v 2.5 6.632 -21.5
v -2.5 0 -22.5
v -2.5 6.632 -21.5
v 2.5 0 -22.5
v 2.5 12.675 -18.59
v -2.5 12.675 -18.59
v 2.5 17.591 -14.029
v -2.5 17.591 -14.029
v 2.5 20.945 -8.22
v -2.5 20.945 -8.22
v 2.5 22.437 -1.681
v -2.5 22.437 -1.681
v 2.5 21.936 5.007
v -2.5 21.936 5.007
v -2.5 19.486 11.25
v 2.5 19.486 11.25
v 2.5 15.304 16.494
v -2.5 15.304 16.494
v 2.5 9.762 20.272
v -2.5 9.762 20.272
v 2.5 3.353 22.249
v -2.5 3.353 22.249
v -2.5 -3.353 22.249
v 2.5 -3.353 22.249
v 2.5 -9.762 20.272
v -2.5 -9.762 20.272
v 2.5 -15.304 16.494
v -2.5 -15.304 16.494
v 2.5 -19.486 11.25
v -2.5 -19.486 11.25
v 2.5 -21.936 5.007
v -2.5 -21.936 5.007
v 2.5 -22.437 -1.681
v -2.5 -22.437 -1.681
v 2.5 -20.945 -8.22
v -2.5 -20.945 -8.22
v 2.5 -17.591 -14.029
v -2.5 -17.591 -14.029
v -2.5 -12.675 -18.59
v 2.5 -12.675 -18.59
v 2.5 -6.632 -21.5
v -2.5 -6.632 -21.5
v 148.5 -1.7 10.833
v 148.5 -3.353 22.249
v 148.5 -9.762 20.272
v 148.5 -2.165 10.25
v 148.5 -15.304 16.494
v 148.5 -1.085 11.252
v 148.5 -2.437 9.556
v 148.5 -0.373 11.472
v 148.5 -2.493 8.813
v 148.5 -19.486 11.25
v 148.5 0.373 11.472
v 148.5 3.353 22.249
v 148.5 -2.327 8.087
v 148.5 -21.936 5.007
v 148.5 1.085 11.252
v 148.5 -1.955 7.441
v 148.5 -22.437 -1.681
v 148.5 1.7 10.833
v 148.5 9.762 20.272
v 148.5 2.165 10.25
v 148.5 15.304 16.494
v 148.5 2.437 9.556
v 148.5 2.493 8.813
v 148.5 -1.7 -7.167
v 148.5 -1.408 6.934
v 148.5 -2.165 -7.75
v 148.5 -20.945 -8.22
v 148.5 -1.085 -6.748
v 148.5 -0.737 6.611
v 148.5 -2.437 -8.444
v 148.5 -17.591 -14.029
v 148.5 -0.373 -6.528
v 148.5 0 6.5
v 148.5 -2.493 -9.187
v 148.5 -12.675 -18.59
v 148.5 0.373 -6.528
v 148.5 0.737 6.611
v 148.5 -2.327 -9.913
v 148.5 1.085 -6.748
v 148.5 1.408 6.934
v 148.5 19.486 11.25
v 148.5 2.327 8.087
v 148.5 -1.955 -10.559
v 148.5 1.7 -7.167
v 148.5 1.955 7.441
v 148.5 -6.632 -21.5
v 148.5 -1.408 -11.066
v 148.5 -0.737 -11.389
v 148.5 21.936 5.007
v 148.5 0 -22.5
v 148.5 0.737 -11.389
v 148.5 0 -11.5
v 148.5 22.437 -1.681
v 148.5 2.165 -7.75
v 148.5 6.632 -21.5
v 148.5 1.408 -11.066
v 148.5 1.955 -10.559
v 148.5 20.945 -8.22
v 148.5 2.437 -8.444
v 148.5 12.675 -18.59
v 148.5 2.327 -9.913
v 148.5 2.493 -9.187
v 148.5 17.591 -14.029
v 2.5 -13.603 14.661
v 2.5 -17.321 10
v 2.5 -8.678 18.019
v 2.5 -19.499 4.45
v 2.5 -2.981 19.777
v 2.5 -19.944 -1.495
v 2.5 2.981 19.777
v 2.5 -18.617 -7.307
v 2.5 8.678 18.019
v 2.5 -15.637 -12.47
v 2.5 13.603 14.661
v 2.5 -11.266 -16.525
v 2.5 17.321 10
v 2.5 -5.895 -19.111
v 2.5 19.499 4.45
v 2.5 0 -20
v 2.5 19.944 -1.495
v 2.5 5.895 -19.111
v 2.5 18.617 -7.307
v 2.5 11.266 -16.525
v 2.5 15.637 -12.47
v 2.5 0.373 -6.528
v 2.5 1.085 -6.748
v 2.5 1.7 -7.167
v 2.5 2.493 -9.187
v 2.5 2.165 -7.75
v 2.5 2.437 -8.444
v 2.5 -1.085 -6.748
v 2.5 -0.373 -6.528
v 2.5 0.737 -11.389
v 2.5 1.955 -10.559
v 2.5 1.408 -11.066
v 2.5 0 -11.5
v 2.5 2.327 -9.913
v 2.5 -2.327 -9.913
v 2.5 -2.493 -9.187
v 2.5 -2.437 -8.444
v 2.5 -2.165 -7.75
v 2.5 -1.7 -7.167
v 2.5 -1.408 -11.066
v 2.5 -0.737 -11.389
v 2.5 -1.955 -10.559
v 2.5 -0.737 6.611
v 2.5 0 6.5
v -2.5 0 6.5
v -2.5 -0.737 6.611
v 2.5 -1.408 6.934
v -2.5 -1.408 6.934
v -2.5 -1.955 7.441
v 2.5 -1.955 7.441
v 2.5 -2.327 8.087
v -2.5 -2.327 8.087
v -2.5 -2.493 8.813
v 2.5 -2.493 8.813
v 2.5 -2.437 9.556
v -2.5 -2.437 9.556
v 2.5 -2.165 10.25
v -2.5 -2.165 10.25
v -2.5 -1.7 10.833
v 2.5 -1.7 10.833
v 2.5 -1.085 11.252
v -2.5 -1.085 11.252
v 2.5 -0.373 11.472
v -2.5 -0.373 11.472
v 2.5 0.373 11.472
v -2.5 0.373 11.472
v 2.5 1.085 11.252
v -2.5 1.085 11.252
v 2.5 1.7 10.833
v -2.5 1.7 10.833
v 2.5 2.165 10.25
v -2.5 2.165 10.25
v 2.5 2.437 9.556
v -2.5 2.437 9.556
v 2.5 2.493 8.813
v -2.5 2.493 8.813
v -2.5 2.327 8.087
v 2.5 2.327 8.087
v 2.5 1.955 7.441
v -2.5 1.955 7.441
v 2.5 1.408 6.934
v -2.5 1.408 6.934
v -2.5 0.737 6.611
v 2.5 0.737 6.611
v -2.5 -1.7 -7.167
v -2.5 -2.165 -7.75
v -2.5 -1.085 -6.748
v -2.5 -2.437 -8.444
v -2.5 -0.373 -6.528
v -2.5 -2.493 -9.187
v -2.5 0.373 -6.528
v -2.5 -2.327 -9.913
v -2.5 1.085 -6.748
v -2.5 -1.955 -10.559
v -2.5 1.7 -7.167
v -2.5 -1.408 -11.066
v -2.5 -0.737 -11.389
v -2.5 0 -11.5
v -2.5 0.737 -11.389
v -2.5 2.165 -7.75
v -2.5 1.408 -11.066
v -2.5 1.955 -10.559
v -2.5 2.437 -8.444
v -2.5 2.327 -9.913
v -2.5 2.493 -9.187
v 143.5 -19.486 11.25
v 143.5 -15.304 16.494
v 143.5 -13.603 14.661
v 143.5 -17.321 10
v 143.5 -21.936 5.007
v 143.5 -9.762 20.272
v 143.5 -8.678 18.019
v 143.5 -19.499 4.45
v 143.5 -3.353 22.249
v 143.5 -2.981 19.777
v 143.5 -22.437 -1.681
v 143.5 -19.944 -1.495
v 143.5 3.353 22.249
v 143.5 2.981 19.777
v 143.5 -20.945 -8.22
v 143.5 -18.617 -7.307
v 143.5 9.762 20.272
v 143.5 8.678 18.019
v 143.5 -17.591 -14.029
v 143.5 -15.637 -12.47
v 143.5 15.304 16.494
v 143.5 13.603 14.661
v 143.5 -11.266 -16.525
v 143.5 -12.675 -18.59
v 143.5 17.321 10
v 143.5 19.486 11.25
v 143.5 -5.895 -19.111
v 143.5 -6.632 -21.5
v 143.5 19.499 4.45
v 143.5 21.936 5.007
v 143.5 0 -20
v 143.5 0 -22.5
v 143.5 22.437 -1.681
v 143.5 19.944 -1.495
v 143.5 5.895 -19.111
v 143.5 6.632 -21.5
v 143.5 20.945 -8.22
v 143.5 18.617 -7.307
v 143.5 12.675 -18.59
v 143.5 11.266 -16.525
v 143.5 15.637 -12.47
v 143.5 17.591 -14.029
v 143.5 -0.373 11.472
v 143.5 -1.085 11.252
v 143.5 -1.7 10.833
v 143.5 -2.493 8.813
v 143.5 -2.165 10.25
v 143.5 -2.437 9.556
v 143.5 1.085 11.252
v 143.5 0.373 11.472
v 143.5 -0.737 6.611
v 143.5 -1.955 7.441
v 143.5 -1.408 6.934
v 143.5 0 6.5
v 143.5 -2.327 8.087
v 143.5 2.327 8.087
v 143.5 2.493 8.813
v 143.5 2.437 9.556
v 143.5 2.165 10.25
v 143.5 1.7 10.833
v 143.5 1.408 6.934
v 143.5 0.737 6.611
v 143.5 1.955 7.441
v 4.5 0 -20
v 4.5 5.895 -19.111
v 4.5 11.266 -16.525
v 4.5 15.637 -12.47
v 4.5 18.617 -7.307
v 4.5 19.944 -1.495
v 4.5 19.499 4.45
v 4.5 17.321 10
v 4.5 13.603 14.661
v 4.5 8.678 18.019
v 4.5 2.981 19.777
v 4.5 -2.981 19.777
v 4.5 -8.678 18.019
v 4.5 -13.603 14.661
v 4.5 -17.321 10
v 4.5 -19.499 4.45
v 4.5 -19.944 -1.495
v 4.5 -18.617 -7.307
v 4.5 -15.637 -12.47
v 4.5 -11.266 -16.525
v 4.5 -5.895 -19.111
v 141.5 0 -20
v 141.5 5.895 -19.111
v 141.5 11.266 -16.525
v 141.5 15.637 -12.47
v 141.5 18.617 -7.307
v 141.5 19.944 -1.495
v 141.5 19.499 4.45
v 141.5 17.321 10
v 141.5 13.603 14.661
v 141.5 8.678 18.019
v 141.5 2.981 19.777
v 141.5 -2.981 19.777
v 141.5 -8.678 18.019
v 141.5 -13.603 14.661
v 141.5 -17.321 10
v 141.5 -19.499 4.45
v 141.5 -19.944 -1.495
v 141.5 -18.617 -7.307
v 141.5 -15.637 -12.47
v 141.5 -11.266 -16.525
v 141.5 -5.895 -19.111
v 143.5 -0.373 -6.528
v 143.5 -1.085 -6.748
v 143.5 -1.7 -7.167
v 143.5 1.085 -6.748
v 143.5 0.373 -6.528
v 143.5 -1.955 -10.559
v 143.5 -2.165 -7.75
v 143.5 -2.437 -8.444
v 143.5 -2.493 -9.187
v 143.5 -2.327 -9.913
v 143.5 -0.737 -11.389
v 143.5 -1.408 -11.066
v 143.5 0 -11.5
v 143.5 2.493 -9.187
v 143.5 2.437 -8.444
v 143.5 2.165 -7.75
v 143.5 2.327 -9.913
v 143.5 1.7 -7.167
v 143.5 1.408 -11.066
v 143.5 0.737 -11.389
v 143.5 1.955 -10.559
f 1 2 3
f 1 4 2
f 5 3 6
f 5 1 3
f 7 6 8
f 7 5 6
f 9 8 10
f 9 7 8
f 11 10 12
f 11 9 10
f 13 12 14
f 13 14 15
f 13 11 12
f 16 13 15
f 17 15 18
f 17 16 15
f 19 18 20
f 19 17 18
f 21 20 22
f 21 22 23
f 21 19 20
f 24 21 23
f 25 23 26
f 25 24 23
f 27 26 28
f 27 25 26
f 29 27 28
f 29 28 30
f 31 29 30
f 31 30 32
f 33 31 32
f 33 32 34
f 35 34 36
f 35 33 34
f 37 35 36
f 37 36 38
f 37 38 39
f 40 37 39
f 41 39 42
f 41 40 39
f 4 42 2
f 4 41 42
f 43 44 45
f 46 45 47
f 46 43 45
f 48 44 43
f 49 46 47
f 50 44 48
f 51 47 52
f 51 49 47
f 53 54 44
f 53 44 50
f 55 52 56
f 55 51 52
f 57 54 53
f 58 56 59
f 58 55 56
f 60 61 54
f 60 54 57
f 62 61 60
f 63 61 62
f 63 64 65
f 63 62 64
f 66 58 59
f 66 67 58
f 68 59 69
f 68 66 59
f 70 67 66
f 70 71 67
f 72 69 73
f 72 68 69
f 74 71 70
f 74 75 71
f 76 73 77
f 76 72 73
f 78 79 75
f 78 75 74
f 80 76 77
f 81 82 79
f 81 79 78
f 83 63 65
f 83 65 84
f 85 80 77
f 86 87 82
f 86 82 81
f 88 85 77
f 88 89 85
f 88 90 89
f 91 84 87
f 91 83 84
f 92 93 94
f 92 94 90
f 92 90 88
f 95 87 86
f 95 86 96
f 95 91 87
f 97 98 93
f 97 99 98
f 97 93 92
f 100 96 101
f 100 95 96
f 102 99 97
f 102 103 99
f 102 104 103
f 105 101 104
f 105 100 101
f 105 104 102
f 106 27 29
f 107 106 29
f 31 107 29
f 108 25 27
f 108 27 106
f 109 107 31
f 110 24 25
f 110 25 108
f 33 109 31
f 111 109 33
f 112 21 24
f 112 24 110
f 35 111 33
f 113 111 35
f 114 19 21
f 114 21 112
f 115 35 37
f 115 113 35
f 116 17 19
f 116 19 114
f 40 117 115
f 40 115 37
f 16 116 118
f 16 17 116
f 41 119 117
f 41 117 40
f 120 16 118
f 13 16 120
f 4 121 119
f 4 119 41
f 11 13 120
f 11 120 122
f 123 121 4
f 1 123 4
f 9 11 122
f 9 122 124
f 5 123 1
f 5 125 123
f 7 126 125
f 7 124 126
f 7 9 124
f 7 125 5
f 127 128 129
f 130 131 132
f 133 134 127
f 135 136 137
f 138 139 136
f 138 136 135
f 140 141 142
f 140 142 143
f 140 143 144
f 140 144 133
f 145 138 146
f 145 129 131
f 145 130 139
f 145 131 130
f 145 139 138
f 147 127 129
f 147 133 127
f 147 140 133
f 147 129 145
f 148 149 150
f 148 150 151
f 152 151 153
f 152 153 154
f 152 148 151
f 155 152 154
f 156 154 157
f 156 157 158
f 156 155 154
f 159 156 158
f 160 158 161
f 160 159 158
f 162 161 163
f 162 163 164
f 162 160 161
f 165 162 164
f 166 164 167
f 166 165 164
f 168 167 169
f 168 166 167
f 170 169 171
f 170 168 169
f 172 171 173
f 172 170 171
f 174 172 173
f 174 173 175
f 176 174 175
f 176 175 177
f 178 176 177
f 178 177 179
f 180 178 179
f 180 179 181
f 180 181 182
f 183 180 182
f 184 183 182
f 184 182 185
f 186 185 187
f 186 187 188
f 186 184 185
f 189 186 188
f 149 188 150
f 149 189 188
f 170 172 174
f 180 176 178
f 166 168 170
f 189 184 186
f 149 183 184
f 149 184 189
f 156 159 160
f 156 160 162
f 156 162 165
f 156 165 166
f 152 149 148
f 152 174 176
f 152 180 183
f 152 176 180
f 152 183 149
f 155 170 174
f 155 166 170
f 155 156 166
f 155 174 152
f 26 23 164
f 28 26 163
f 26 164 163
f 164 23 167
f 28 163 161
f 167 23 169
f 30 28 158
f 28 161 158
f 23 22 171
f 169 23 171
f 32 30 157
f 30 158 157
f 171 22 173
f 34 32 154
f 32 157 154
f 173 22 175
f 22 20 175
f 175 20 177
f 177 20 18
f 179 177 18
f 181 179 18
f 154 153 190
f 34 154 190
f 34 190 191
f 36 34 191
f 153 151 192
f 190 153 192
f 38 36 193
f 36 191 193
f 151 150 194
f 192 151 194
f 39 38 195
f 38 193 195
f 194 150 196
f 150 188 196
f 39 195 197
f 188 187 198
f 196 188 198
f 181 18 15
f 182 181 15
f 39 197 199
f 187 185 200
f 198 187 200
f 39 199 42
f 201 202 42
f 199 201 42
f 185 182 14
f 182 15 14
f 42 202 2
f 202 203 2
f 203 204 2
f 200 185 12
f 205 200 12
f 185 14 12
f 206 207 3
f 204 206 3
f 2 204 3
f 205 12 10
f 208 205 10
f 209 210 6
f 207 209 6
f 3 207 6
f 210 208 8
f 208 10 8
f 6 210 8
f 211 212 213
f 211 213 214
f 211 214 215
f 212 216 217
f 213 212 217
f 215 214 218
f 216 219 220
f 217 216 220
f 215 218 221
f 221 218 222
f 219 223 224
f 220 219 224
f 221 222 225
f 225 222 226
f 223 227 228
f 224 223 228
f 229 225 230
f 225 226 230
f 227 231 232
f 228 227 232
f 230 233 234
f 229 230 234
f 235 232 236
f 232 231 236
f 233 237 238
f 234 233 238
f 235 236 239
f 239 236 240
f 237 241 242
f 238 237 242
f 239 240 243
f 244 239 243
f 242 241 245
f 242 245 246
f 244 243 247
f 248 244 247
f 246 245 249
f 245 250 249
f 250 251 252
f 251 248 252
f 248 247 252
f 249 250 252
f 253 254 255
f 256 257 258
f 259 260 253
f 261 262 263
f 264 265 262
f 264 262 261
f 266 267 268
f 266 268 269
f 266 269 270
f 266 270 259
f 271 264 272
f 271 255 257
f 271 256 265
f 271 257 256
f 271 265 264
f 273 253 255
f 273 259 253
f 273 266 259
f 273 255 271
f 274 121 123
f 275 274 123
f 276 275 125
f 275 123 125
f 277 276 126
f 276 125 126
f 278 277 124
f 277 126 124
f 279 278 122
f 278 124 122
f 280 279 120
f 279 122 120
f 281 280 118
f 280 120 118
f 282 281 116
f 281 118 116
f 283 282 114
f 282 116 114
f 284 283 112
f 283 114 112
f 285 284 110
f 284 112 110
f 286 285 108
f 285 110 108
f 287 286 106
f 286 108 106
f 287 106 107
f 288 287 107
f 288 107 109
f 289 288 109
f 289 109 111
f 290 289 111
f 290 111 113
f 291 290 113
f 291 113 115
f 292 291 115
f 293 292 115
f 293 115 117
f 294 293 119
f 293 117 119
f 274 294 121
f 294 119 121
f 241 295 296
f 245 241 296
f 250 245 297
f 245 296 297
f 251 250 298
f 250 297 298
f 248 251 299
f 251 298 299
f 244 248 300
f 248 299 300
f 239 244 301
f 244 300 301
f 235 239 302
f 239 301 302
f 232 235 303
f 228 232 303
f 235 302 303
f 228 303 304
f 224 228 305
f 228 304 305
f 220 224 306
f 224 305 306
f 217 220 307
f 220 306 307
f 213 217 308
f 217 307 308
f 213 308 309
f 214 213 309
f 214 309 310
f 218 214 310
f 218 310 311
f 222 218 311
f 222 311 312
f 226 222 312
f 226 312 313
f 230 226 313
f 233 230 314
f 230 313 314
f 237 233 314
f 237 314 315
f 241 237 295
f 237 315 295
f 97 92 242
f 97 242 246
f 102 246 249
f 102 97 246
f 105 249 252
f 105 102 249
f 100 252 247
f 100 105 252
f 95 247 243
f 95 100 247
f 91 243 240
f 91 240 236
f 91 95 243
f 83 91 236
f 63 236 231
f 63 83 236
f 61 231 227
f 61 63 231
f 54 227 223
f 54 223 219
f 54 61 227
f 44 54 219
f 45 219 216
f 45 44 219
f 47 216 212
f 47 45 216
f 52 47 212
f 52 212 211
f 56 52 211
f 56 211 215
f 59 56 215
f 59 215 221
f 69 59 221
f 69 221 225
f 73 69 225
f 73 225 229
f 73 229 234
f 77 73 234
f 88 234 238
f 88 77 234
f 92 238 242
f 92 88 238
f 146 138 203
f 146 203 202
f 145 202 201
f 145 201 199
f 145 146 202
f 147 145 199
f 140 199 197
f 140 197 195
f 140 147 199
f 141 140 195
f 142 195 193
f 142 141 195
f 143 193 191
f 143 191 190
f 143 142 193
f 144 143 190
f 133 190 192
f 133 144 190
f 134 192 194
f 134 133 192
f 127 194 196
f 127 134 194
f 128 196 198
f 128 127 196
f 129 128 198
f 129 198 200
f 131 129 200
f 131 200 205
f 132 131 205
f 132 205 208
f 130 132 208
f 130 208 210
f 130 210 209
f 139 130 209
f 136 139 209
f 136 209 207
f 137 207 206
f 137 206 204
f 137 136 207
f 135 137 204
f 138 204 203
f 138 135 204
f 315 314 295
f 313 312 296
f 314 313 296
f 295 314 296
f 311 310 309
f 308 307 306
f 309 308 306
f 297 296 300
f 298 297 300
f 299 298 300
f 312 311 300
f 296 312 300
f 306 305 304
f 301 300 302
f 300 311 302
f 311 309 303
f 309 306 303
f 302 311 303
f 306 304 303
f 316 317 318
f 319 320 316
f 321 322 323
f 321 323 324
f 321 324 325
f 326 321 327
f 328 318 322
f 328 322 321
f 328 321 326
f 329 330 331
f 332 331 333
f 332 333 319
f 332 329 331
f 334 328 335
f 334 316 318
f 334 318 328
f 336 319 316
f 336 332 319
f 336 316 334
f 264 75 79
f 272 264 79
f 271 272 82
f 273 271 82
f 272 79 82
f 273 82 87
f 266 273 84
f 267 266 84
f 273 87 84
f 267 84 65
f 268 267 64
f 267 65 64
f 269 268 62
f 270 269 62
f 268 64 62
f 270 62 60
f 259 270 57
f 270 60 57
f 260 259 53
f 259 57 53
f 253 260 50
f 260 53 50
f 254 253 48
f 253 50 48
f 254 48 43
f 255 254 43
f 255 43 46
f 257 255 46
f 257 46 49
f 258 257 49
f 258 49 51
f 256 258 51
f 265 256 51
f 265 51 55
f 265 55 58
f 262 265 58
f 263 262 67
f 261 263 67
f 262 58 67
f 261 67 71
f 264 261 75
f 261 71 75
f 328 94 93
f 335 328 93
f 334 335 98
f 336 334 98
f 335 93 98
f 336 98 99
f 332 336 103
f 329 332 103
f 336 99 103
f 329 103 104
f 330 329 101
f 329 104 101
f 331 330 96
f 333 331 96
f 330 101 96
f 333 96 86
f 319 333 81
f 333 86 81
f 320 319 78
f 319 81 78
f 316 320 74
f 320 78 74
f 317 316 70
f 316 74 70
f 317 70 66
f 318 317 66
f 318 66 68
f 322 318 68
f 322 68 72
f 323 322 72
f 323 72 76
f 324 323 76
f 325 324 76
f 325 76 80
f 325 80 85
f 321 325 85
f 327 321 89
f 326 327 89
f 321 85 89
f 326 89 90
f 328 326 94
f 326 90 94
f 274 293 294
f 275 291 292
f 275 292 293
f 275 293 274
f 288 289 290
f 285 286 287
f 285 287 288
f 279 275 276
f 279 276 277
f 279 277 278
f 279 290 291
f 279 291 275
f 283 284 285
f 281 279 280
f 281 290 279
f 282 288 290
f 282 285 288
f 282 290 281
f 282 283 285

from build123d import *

# Parameters (mm, degrees)
SKETCH1_R           = 22.5
BOSS_EXTRUDE1_DEPTH = 2.5
SKETCH2_R           = 20
BOSS_EXTRUDE2_DEPTH = 2
BOSS_EXTRUDE3_START = 66
SKETCH3_R           = 22.5
BOSS_EXTRUDE3_DEPTH = 66
SKETCH4_R           = 12.5
BOSS_EXTRUDE4_DEPTH = 5
BOSS_EXTRUDE5_START = 66
SKETCH5_R           = 22.5
BOSS_EXTRUDE5_DEPTH = 66
SKETCH6_R           = 20
BOSS_EXTRUDE6_DEPTH = 2
BOSS_EXTRUDE7_START = 5
SKETCH7_R           = 22.5
BOSS_EXTRUDE7_DEPTH = 5
SKETCH8_R           = 2.5
CUT_EXTRUDE1_DEPTH  = 5
CUT_EXTRUDE2_START  = -5
SKETCH9_R           = 2.5
CUT_EXTRUDE2_DEPTH  = 5
SKETCH10_W          = 137
SKETCH10_H          = 45
CUT_EXTRUDE4_DEPTH  = 32


with BuildPart() as part:
    # Sketch1 → Boss-Extrude1 (new, symmetric)
    with BuildSketch(Plane(origin=(0, 0, 0), x_dir=(0, 0, -1), z_dir=(1, 0, 0))):
        Circle(SKETCH1_R)
    extrude(amount=BOSS_EXTRUDE1_DEPTH, both=True)

    # Sketch2 → Boss-Extrude2 (add)
    with BuildSketch(Plane(origin=(2.5, 0, 0), x_dir=(0, 0, -1), z_dir=(1, 0, 0))):
        Circle(SKETCH2_R)
    extrude(amount=BOSS_EXTRUDE2_DEPTH)

    # Sketch3 → Boss-Extrude3 (add)
    with BuildSketch(Plane(origin=(4.5, 0, 0), x_dir=(0, 0, -1), z_dir=(1, 0, 0)).offset(BOSS_EXTRUDE3_START)):
        Circle(SKETCH3_R)
    extrude(amount=-BOSS_EXTRUDE3_DEPTH)

    # Sketch4 → Boss-Extrude4 (add)
    with BuildSketch(Plane(origin=(70.5, 0, 0), x_dir=(0, 0, -1), z_dir=(1, 0, 0))):
        Circle(SKETCH4_R)
    extrude(amount=BOSS_EXTRUDE4_DEPTH)

    # Sketch5 → Boss-Extrude5 (add)
    with BuildSketch(Plane(origin=(75.5, 0, 0), x_dir=(0, 0, -1), z_dir=(1, 0, 0)).offset(BOSS_EXTRUDE5_START)):
        Circle(SKETCH5_R)
    extrude(amount=-BOSS_EXTRUDE5_DEPTH)

    # Sketch6 → Boss-Extrude6 (add)
    with BuildSketch(Plane(origin=(141.5, 0, 0), x_dir=(0, 0, -1), z_dir=(1, 0, 0))):
        Circle(SKETCH6_R)
    extrude(amount=BOSS_EXTRUDE6_DEPTH)

    # Sketch7 → Boss-Extrude7 (add)
    with BuildSketch(Plane(origin=(143.5, 0, 0), x_dir=(0, 0, -1), z_dir=(1, 0, 0)).offset(BOSS_EXTRUDE7_START)):
        Circle(SKETCH7_R)
    extrude(amount=-BOSS_EXTRUDE7_DEPTH)

    # Sketch8 → Cut-Extrude1 (cut)
    with BuildSketch(Plane(origin=(148.5, 0, 0), x_dir=(0, 0, -1), z_dir=(1, 0, 0))):
        with Locations((-9, 0)):
            Circle(SKETCH8_R)
        with Locations((9, 0)):
            Circle(SKETCH8_R)
    extrude(amount=-CUT_EXTRUDE1_DEPTH, mode=Mode.SUBTRACT)

    # Sketch9 → Cut-Extrude2 (cut)
    with BuildSketch(Plane.ZY.offset(2.5).offset(CUT_EXTRUDE2_START)):
        with Locations(Location((-9, 0, 0), (0, 0, 180))):
            Circle(SKETCH9_R)
        with Locations(Location((9, 0, 0), (0, 0, 180))):
            Circle(SKETCH9_R)
    extrude(amount=CUT_EXTRUDE2_DEPTH, mode=Mode.SUBTRACT)

    # Sketch10 → Cut-Extrude4 (cut, symmetric)
    with BuildSketch(Plane.XY):
        with Locations((73, 0)):
            Rectangle(SKETCH10_W, SKETCH10_H)
    extrude(amount=CUT_EXTRUDE4_DEPTH, both=True, mode=Mode.SUBTRACT)


with BuildPart() as cut_extrude4_piece_1:
    # of the separate pieces the step leaves, piece 1, a body of its own (cut_extrude4_pieces)
    add(part.part.solids().sort_by_distance((2.5, 0, -20))[0])


with BuildPart() as cut_extrude4_piece_2:
    # of the separate pieces the step leaves, piece 2, a body of its own (cut_extrude4_pieces)
    add(part.part.solids().sort_by_distance((148.5, 0, -22.5))[0])


solid = Compound([cut_extrude4_piece_1.part, cut_extrude4_piece_2.part])
